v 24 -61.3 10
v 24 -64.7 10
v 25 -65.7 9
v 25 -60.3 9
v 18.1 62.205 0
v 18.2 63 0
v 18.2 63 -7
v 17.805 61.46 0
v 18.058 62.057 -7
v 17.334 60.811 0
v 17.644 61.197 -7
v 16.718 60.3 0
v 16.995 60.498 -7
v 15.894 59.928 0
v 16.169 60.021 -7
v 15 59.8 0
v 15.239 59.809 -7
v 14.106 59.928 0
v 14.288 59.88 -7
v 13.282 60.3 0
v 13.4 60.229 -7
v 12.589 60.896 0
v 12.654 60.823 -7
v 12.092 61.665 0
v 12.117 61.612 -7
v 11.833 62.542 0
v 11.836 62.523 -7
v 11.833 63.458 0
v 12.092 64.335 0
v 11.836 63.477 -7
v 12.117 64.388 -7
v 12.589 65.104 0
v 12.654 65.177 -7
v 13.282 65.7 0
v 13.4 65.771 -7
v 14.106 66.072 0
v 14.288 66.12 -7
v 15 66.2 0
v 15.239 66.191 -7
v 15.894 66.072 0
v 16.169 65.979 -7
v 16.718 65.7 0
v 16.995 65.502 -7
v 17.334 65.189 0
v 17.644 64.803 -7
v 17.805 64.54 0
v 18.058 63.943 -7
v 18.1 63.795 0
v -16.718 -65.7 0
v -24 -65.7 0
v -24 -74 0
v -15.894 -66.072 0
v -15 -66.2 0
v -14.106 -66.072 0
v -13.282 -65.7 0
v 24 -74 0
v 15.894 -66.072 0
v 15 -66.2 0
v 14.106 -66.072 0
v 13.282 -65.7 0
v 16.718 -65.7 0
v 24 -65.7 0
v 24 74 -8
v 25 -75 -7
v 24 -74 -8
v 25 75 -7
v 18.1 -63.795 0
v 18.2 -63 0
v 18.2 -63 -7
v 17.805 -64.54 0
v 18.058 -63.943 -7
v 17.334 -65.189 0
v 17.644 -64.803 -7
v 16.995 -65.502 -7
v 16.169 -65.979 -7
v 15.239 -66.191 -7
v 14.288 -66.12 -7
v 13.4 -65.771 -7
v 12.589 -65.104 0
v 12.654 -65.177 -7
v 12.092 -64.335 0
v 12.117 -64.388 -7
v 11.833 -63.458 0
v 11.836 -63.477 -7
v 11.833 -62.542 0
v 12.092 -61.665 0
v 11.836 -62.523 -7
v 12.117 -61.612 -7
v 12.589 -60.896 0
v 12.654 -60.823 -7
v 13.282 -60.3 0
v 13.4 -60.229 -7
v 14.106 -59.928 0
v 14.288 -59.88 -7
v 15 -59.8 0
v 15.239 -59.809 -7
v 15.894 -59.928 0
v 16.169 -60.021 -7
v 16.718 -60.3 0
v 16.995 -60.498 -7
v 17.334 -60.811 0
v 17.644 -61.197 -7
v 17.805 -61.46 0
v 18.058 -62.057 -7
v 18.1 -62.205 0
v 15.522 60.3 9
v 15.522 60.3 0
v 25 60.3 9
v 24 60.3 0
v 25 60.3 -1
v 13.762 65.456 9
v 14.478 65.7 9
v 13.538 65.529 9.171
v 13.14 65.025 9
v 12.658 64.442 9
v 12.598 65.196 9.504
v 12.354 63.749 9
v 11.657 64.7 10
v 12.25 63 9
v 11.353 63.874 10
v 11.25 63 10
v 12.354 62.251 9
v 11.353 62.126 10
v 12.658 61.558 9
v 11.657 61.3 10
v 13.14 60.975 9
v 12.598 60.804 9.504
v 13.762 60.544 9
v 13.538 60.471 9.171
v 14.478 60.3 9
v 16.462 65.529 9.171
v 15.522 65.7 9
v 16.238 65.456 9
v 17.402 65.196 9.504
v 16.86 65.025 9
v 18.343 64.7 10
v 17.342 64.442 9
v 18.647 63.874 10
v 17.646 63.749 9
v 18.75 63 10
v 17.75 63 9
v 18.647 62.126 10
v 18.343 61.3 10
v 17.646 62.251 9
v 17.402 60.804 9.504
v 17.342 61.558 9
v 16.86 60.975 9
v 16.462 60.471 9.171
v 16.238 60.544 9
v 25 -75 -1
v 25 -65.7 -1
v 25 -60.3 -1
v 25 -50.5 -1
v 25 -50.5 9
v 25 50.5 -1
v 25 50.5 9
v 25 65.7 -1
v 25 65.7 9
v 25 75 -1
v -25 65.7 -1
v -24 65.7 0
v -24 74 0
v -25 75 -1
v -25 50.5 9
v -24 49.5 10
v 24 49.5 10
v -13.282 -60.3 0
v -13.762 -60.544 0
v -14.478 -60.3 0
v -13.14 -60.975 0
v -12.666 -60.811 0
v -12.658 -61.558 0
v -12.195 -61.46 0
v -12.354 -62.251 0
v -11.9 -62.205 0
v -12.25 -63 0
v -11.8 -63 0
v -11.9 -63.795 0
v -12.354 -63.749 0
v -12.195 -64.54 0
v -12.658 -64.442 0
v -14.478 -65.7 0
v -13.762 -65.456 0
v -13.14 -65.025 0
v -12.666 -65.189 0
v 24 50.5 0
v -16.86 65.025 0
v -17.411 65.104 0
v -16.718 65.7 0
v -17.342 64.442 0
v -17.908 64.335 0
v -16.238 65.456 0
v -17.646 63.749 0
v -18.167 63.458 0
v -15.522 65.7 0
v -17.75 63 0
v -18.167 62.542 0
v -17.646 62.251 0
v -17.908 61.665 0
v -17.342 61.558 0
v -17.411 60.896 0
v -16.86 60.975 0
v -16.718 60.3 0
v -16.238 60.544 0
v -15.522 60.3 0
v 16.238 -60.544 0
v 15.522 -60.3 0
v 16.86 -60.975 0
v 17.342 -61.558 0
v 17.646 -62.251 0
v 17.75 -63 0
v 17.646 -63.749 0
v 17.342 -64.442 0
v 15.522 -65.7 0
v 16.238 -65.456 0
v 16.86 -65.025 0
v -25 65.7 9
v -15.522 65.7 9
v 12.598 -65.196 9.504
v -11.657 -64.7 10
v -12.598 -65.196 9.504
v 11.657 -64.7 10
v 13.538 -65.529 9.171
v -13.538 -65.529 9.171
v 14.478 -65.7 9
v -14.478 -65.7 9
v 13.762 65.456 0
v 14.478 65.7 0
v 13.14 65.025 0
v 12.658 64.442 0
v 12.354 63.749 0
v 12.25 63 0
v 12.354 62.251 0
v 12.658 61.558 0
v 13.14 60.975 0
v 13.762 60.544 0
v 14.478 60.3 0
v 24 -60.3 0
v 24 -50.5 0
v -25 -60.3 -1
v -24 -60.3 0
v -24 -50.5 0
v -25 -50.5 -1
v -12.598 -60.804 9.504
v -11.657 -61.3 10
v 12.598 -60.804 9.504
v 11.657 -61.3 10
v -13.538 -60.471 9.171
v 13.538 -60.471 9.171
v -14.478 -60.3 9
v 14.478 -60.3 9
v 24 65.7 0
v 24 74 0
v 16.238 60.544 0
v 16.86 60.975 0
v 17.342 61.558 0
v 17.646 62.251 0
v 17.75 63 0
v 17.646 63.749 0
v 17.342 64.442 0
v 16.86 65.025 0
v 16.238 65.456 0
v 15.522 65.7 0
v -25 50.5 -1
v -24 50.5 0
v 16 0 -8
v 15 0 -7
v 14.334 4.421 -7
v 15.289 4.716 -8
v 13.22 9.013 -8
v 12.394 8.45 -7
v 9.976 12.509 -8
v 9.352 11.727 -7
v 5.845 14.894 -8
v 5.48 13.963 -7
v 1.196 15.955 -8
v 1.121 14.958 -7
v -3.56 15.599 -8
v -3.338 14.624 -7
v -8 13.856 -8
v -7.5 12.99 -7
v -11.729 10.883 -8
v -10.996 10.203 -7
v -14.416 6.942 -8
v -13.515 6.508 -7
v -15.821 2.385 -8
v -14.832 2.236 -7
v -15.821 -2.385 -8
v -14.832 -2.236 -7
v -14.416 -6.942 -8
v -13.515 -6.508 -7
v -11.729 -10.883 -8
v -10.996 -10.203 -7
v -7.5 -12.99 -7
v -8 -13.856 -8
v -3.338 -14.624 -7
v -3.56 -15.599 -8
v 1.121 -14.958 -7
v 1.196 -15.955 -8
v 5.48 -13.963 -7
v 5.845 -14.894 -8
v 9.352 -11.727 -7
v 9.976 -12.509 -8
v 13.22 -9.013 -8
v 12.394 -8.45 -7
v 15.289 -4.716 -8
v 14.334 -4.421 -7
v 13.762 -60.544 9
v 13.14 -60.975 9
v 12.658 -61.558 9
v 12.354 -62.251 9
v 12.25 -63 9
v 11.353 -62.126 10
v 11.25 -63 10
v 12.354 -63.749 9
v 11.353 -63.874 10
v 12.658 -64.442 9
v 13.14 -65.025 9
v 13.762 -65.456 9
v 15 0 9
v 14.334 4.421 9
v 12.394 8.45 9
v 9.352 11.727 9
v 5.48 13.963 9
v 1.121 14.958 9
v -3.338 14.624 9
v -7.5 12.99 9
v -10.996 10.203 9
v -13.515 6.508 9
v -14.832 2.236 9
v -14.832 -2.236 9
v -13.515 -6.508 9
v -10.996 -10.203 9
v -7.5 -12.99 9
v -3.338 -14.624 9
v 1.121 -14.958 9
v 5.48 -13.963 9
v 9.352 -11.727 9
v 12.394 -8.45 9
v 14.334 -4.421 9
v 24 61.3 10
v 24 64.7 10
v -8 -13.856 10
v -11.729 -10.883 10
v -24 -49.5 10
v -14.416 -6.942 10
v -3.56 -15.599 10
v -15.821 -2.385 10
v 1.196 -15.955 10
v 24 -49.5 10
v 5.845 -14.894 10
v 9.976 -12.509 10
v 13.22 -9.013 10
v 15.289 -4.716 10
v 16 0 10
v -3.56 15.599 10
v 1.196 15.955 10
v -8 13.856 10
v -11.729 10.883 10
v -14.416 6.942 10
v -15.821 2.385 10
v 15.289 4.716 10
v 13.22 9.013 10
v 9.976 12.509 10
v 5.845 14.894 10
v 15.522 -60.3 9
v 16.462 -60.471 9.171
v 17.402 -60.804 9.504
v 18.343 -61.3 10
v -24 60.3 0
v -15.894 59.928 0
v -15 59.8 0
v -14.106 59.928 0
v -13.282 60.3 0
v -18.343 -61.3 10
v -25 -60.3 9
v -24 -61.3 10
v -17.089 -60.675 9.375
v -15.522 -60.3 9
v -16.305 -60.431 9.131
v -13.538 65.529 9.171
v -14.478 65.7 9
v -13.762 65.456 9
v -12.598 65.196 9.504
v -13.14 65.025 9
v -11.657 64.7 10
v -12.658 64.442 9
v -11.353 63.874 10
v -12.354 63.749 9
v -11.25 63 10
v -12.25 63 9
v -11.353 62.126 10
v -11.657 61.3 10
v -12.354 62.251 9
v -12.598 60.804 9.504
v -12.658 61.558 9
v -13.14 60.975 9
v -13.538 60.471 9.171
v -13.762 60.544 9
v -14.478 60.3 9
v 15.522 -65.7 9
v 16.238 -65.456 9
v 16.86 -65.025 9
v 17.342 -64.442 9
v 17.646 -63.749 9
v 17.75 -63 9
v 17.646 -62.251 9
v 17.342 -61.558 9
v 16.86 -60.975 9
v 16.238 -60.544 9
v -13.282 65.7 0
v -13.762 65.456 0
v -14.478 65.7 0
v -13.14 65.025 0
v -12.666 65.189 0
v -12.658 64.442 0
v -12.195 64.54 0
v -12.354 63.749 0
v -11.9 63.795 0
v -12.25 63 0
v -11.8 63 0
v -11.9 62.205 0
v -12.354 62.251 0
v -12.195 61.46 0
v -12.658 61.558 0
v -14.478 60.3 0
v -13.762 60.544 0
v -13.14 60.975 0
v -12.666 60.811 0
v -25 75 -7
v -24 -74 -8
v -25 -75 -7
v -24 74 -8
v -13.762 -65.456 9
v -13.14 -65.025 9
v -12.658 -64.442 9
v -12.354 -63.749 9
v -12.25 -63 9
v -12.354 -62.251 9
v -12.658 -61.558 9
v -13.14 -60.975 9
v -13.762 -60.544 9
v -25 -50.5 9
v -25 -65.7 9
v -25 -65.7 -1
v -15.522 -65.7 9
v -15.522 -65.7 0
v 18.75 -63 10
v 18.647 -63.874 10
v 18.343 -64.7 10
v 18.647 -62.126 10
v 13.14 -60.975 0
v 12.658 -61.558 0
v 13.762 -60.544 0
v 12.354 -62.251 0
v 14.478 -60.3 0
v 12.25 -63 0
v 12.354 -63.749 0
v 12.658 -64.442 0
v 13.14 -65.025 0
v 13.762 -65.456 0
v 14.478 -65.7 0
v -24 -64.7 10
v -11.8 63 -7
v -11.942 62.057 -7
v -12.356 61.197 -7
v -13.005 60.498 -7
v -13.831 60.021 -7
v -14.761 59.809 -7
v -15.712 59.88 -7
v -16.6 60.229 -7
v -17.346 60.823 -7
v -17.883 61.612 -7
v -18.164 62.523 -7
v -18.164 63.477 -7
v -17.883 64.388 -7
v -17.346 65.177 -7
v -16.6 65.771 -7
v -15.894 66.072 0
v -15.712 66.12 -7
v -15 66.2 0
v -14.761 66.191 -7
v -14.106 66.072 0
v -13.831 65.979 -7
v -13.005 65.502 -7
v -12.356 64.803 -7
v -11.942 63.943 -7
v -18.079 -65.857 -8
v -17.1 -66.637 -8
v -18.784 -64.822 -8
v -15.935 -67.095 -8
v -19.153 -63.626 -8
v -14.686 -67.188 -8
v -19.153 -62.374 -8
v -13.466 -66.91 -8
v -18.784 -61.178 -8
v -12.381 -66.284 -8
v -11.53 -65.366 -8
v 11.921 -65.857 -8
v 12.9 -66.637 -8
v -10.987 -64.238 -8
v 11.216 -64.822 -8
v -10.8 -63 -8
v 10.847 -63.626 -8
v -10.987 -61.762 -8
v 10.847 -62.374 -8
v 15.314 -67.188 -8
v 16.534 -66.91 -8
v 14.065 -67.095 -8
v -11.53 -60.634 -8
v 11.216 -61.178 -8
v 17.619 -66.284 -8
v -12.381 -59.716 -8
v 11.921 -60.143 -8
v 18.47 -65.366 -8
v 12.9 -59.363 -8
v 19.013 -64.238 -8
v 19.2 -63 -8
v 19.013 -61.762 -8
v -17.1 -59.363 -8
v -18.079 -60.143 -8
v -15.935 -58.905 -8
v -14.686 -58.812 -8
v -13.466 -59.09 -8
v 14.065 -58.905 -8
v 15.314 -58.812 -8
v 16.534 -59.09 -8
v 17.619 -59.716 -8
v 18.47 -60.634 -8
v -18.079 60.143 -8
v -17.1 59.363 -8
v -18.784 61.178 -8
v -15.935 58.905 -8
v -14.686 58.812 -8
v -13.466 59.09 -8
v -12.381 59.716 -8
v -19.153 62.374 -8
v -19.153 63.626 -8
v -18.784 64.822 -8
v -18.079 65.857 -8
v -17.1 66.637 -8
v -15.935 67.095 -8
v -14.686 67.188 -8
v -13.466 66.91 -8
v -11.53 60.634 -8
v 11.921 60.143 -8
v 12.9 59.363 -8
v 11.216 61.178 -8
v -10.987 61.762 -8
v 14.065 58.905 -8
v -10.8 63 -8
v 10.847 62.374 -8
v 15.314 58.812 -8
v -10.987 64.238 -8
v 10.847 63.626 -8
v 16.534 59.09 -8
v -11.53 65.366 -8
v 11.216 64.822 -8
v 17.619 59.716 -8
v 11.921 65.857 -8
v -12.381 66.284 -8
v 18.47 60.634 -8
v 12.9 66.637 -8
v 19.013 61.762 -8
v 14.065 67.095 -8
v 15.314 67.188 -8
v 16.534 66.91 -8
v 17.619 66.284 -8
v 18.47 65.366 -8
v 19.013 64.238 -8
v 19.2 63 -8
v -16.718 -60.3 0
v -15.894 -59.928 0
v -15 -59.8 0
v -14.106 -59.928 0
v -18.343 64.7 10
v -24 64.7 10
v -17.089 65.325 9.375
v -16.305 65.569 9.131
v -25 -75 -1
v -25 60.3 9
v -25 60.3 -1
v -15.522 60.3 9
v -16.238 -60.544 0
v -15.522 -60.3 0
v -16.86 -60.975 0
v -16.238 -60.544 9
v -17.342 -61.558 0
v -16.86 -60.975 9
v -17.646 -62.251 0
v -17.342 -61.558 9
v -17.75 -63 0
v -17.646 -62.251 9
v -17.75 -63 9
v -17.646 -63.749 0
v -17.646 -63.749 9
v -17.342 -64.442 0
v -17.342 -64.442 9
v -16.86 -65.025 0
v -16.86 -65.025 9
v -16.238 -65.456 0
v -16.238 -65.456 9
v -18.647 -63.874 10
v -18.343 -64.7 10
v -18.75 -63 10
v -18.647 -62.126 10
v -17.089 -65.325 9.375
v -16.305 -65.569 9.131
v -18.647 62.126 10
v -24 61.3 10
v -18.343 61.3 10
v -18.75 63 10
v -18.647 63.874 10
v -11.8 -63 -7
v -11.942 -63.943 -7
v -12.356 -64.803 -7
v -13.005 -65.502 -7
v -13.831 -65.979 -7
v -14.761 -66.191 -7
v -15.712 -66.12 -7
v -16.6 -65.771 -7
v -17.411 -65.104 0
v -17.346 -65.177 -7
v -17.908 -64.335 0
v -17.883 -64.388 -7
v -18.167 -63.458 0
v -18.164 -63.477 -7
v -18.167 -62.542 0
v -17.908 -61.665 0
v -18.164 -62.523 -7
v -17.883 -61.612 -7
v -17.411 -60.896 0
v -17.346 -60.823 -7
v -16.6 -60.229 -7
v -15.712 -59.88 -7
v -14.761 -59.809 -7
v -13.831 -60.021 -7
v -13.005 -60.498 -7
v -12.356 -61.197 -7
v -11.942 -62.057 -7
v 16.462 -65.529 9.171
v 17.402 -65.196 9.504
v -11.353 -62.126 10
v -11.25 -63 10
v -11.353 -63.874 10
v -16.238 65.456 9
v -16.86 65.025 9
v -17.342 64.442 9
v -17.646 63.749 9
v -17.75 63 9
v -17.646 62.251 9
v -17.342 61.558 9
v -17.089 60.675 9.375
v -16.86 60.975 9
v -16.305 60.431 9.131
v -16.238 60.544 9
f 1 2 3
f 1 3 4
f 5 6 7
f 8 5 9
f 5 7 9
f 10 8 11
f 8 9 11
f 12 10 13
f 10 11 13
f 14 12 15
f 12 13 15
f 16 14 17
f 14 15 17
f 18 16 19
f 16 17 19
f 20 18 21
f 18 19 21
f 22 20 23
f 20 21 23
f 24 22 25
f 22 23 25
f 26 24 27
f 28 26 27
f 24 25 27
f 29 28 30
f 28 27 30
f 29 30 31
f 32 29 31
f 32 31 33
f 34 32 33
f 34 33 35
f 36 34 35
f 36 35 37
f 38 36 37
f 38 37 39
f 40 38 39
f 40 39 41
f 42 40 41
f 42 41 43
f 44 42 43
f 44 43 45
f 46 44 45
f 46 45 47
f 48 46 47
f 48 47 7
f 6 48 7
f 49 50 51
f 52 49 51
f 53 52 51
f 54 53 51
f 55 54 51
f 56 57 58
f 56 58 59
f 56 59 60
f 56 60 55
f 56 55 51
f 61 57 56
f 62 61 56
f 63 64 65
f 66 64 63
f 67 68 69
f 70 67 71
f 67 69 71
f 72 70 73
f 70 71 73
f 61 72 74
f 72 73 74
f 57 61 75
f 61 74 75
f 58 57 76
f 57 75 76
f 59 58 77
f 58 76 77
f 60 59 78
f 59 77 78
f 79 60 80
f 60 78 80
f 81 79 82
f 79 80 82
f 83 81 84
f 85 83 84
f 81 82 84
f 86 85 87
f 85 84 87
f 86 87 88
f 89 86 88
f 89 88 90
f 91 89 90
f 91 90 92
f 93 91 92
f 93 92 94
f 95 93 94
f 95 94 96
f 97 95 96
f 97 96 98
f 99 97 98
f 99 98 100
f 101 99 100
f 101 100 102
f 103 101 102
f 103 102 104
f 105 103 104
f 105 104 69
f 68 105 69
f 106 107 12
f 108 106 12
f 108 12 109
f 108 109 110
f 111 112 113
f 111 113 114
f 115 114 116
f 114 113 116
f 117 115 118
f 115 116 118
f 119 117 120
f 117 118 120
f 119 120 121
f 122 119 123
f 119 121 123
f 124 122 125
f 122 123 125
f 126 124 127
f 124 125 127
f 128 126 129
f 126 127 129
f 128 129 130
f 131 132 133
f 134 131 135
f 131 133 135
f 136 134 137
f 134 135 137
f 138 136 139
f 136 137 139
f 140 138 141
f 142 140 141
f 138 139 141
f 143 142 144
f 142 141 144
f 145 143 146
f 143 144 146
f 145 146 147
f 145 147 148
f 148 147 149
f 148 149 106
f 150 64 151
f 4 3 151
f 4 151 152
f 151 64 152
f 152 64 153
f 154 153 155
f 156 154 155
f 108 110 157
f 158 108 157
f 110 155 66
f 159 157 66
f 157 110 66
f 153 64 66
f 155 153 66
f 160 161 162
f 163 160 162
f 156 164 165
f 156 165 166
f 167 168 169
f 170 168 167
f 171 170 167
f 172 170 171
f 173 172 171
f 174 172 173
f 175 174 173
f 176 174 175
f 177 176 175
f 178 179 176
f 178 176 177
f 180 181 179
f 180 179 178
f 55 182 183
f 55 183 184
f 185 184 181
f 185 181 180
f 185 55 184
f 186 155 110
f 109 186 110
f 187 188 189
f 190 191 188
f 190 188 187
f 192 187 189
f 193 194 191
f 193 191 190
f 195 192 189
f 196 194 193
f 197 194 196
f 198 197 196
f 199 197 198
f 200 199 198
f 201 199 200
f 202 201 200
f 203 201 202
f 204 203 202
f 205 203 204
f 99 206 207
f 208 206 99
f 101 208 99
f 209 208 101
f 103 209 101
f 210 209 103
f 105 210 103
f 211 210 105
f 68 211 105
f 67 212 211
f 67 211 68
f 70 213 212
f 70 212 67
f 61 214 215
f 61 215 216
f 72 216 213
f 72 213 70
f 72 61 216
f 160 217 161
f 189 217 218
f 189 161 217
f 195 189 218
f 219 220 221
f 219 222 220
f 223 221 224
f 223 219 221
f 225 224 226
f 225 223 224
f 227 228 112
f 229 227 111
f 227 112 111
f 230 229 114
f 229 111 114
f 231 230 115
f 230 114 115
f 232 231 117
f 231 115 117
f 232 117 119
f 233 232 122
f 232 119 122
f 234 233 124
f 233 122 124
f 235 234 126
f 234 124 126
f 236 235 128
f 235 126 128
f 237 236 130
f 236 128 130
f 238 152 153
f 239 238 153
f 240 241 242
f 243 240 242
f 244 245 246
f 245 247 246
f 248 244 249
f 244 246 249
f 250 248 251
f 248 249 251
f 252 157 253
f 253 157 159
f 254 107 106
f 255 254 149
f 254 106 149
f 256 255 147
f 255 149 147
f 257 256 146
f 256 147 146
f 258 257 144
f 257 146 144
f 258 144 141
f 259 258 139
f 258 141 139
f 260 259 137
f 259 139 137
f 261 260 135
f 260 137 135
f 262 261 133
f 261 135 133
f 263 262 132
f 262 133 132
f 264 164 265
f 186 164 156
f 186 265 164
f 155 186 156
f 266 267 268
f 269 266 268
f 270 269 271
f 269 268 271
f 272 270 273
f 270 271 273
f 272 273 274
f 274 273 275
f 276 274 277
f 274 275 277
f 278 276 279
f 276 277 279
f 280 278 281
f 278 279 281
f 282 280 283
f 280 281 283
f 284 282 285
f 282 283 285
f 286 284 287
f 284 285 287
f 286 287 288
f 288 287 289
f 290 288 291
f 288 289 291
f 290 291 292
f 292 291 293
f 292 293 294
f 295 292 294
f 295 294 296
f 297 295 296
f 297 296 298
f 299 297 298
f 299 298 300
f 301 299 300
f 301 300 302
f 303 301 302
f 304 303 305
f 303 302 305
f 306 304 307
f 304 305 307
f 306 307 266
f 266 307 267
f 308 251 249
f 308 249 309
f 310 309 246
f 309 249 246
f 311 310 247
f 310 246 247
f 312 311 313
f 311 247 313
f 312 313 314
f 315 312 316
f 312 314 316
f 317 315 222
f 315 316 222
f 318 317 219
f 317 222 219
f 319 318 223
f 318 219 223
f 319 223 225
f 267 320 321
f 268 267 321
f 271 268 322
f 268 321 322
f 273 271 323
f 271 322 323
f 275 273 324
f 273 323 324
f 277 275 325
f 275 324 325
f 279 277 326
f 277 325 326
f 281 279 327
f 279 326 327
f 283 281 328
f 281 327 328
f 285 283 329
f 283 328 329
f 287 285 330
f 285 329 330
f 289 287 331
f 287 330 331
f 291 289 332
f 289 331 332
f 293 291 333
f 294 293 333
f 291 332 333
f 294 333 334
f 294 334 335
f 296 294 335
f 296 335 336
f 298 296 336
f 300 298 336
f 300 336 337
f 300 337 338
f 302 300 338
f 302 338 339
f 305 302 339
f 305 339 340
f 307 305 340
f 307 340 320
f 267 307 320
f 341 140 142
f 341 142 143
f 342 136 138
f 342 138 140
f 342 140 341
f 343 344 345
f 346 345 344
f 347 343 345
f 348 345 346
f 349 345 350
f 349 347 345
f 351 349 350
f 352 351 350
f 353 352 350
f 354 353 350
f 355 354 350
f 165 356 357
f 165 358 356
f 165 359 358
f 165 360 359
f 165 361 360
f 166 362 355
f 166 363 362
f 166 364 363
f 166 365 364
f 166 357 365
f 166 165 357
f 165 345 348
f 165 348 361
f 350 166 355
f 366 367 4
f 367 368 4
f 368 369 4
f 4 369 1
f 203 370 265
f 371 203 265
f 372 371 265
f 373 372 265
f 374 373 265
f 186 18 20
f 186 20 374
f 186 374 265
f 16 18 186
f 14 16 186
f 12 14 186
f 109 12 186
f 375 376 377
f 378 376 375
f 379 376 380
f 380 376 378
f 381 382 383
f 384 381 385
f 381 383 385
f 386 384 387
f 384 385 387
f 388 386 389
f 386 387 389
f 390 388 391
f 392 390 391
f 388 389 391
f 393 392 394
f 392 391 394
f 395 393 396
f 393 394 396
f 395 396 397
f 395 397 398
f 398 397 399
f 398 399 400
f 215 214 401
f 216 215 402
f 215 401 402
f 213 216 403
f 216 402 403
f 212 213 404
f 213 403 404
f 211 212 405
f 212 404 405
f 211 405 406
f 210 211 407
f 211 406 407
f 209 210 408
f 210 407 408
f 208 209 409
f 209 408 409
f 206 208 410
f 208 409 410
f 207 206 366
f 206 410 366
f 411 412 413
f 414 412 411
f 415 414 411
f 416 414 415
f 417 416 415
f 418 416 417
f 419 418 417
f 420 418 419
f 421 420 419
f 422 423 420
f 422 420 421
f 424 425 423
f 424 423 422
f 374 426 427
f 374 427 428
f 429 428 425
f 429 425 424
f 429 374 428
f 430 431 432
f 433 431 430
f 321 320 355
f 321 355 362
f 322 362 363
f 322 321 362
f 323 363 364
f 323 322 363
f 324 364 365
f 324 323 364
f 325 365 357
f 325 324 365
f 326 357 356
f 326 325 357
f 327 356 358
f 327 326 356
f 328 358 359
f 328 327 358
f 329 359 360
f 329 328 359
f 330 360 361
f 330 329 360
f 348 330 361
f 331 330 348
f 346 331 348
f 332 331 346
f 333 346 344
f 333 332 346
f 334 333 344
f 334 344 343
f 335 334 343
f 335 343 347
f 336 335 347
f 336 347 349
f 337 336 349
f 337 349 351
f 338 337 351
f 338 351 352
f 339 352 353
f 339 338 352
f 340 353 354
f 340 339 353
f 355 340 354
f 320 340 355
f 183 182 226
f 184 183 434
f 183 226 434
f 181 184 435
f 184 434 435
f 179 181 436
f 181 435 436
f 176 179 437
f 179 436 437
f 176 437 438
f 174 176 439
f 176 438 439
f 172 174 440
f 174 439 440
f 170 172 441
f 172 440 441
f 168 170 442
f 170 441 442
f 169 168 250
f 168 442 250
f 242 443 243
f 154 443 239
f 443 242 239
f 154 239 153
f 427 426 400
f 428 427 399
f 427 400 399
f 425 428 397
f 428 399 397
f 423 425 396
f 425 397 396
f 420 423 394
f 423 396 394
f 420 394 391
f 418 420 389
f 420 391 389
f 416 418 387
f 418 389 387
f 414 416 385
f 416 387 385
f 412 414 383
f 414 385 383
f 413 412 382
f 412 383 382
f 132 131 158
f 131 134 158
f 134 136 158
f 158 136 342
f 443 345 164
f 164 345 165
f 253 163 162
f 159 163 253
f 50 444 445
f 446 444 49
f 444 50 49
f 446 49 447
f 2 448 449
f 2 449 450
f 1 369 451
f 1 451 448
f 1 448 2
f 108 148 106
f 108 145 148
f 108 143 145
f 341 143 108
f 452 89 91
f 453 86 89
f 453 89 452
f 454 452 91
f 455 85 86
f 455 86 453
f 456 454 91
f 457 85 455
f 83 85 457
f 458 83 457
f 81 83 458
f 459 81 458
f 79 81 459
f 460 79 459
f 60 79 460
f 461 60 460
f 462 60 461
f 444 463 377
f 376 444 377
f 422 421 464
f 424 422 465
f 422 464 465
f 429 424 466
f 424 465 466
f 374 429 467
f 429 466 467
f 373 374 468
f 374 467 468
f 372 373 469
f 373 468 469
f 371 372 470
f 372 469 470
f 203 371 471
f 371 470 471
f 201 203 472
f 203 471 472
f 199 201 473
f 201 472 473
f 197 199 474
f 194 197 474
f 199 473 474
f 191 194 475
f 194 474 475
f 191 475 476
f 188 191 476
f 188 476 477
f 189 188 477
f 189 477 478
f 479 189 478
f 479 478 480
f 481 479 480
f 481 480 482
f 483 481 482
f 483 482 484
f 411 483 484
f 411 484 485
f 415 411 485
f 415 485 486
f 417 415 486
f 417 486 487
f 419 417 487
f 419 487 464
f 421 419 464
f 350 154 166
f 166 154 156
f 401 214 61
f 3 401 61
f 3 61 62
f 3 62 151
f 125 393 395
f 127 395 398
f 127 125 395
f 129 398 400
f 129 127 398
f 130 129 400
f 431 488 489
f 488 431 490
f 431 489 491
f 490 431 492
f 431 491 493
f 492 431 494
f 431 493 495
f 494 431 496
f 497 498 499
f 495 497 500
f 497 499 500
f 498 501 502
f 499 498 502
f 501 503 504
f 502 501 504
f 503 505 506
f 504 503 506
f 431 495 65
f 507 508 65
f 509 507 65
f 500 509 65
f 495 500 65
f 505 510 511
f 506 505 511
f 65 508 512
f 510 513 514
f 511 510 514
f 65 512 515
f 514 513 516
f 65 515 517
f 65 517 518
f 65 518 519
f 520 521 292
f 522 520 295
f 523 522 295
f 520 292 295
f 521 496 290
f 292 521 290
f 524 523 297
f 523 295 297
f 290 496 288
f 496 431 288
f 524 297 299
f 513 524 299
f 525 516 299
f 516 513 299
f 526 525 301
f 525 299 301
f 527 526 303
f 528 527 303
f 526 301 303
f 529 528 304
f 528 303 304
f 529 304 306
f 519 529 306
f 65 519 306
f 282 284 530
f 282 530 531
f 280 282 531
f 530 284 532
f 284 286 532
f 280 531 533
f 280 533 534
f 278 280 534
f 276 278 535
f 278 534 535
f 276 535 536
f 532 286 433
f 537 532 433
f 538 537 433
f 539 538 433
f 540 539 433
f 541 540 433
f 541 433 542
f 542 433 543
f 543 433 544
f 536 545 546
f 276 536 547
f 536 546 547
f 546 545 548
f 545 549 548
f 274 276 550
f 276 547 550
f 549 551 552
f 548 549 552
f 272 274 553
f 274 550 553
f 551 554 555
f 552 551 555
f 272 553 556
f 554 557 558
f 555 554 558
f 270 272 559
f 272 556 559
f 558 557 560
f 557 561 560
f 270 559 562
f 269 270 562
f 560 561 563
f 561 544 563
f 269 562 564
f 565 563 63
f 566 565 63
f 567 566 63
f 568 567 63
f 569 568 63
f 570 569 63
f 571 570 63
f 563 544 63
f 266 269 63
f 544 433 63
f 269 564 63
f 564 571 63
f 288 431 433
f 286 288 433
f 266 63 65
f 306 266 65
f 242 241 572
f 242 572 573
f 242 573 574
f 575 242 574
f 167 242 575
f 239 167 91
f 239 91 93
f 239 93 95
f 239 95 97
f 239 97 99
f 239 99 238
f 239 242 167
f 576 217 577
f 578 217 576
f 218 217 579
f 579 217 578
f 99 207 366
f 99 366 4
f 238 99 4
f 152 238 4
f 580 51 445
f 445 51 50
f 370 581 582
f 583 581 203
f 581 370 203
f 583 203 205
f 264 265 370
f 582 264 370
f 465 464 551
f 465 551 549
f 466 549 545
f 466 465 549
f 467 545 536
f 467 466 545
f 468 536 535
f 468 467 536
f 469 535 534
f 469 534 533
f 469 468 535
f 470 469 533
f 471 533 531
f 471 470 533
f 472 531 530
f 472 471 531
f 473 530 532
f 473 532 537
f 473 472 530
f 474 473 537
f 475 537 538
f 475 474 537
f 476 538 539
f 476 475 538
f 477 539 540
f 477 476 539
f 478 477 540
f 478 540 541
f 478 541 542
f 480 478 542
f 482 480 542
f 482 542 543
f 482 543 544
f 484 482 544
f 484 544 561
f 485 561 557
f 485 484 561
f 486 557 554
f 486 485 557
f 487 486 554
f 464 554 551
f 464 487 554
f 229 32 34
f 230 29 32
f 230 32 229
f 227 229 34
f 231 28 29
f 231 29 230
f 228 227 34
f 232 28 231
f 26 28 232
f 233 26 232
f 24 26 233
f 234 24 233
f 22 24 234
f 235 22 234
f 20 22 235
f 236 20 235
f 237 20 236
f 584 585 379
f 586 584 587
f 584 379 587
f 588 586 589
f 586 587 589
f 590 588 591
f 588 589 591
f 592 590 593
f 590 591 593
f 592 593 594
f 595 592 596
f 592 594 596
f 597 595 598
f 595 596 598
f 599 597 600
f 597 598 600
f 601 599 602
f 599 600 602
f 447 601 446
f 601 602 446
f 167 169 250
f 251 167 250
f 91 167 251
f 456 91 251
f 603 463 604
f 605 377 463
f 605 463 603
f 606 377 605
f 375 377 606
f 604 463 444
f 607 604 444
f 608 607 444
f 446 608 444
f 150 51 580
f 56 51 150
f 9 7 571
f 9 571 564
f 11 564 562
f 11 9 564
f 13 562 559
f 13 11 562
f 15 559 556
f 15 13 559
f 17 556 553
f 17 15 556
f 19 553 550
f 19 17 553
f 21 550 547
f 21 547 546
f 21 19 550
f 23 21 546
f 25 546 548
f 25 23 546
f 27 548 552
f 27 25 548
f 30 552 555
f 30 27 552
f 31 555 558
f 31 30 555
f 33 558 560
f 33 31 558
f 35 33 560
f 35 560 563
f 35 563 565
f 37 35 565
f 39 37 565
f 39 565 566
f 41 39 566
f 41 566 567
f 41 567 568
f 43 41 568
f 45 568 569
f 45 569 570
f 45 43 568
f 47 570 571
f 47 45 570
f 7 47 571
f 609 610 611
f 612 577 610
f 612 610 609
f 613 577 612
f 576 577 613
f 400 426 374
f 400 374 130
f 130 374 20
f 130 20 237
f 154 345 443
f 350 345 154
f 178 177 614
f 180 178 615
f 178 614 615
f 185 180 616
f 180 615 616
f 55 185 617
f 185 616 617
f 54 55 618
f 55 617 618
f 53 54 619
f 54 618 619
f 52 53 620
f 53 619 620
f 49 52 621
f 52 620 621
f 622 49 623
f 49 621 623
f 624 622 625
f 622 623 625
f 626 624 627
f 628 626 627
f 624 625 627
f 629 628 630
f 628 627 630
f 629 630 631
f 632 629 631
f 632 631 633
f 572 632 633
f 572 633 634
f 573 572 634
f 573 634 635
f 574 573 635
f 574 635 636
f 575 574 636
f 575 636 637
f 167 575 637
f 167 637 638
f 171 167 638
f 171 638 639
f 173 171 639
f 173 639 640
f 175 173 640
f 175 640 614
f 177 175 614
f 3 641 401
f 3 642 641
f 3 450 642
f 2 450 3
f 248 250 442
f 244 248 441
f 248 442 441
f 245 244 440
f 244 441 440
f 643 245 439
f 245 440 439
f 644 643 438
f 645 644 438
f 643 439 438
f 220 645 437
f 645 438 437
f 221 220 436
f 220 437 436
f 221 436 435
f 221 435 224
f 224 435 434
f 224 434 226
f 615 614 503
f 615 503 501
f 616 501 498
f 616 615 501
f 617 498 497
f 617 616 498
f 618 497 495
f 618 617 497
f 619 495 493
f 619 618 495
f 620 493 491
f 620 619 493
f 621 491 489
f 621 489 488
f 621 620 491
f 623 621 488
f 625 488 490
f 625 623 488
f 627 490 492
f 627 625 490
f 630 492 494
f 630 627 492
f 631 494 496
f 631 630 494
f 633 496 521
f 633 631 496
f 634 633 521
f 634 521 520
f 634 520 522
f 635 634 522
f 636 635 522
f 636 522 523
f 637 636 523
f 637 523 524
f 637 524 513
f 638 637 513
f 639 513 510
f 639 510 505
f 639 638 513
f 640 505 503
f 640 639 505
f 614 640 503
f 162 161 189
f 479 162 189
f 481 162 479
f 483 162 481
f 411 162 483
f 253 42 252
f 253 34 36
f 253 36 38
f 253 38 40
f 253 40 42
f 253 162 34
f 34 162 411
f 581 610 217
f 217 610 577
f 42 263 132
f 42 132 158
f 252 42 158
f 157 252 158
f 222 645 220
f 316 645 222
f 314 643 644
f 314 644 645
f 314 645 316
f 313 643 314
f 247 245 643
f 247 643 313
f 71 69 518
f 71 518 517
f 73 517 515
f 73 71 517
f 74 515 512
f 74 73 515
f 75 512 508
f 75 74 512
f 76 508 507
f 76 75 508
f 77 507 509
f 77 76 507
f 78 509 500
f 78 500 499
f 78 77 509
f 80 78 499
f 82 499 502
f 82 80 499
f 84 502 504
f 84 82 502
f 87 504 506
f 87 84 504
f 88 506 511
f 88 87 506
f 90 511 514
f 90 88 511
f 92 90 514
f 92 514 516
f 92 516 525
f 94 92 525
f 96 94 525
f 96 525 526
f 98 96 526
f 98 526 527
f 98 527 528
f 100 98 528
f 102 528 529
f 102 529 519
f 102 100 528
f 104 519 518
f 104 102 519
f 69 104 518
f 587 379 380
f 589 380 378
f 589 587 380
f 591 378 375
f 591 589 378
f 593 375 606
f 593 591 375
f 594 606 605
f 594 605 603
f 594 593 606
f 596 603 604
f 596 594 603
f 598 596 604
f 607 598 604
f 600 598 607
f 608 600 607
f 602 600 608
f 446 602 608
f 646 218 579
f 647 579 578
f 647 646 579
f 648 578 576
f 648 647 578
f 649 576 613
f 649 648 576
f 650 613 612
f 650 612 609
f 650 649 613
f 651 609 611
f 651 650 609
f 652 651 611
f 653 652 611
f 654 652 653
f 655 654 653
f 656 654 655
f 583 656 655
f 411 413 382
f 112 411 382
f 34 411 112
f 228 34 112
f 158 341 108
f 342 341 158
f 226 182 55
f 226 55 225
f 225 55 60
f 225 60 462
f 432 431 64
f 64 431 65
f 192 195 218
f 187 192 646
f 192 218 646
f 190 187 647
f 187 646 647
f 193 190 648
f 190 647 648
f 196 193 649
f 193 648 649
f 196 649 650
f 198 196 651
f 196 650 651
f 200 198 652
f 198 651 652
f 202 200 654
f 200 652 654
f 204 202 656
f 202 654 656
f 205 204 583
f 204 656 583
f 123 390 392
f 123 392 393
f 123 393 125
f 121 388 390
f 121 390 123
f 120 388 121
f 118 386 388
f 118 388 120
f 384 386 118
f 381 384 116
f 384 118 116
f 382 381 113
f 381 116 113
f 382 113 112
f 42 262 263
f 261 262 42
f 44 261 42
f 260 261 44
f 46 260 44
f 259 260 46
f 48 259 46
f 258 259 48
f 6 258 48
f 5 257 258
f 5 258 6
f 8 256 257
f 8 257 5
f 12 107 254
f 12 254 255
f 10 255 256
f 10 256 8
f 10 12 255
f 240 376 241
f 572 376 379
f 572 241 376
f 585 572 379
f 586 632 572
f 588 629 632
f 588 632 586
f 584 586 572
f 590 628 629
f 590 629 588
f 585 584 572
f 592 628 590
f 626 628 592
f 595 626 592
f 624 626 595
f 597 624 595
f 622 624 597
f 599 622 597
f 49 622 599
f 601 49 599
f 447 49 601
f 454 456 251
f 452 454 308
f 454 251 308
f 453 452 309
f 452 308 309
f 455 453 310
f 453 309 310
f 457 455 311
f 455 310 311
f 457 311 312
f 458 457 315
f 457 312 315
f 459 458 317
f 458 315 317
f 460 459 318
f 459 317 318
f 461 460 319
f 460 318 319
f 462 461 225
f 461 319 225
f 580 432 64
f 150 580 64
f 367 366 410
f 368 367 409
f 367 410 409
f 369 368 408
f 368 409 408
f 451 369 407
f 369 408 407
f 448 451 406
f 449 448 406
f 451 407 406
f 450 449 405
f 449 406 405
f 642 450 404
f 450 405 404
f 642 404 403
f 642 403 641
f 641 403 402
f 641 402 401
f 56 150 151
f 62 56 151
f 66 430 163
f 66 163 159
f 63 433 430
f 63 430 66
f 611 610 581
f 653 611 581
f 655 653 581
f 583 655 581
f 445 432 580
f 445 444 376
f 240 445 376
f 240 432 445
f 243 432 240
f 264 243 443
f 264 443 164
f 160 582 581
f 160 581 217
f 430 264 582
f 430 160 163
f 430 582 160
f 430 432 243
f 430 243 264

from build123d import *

# Parameters (mm, degrees)
SKETCH013_W     = 50
SKETCH013_H     = 150
PAD008_DEPTH    = 8
SKETCH014_W     = 50
SKETCH014_H     = 5.4
SKETCH014_H_2   = 101
PAD009_DEPTH    = 10
SKETCH015_R     = 2.75
POCKET003_DEPTH = 18.001
SKETCH016_R     = 3.2
POCKET004_DEPTH = 8
SKETCH017_R     = 15
POCKET005_DEPTH = 18.001
CHAMFER002_SIZE = 1


with BuildPart() as part:
    # Sketch013 → Pad008 (new body)
    with BuildSketch(Plane.XY.offset(-8)):
        Rectangle(SKETCH013_W, SKETCH013_H)
    extrude(amount=PAD008_DEPTH)

    # Sketch014 → Pad009 (join)
    with BuildSketch(Plane.XY):
        with Locations((0, 63)):
            Rectangle(SKETCH014_W, SKETCH014_H)
        with Locations((0, -63)):
            Rectangle(SKETCH014_W, SKETCH014_H)
        Rectangle(SKETCH014_W, SKETCH014_H_2)
    extrude(amount=PAD009_DEPTH)

    # Sketch015 (on Face18 of Pad009) → Pocket003 (cut, through all)
    with BuildSketch(Plane.XY.offset(10)):
        with Locations((-15, 63)):
            Circle(SKETCH015_R)
        with Locations((15, 63)):
            Circle(SKETCH015_R)
        with Locations((-15, -63)):
            Circle(SKETCH015_R)
        with Locations((15, -63)):
            Circle(SKETCH015_R)
    extrude(amount=-POCKET003_DEPTH, mode=Mode.SUBTRACT)

    # Sketch016 (on Face4 of Pocket003) → Pocket004 (cut)
    with BuildSketch(Plane(origin=(0, 0, -8), x_dir=(1, 0, 0), z_dir=(0, 0, -1))):
        with Locations((-15, -63)):
            Circle(SKETCH016_R)
        with Locations((15, -63)):
            Circle(SKETCH016_R)
        with Locations((15, 63)):
            Circle(SKETCH016_R)
        with Locations((-15, 63)):
            Circle(SKETCH016_R)
    extrude(amount=-POCKET004_DEPTH, mode=Mode.SUBTRACT)

    # Sketch017 (on Face26 of Pocket004) → Pocket005 (cut, through all)
    with BuildSketch(Plane.XY.offset(10)):
        Circle(SKETCH017_R)
    extrude(amount=-POCKET005_DEPTH, mode=Mode.SUBTRACT)

    # Chamfer002
    chamfer002_edges = [part.edges().sort_by_distance(p)[0] for p in [
        (-25, 0, 10),
        (0, 50.5, 10),
        (0, -50.5, 10),
        (25, 0, 10),
        (-15, 0, 10),
        (20.261008, 65.7, 10),
        (25, 63, 10),
        (20.261008, 60.3, 10),
        (17.12109, 61.24972, 10),
        (17.12109, 64.75028, 10),
        (0, 65.7, 10),
        (12.25, 63, 10),
        (0, 60.3, 10),
        (-12.87891, 61.24972, 10),
        (-12.87891, 64.75028, 10),
        (-20.261008, 65.7, 10),
        (-17.75, 63, 10),
        (-20.261008, 60.3, 10),
        (-25, 63, 10),
        (20.261008, -60.3, 10),
        (25, -63, 10),
        (20.261008, -65.7, 10),
        (17.12109, -64.75028, 10),
        (17.12109, -61.24972, 10),
        (0, -60.3, 10),
        (12.25, -63, 10),
        (0, -65.7, 10),
        (-12.87891, -64.75028, 10),
        (-12.87891, -61.24972, 10),
        (-20.261008, -60.3, 10),
        (-17.75, -63, 10),
        (-20.261008, -65.7, 10),
        (-25, -63, 10),
        (0, -75, 0),
        (25, -55.4, 0),
        (25, -70.35, 0),
        (-25, -70.35, 0),
        (-25, -55.4, 0),
        (-25, 55.4, 0),
        (25, 55.4, 0),
        (25, 70.35, 0),
        (0, 75, 0),
        (-25, 70.35, 0),
        (-25, 0, -8),
        (0, 75, -8),
        (0, -75, -8),
        (25, 0, -8),
        (-18.2, -63, -8),
        (11.8, -63, -8),
        (-15, 0, -8),
        (-18.2, 63, -8),
        (11.8, 63, -8),
    ]]
    chamfer(chamfer002_edges, length=CHAMFER002_SIZE)


solid = part.part
